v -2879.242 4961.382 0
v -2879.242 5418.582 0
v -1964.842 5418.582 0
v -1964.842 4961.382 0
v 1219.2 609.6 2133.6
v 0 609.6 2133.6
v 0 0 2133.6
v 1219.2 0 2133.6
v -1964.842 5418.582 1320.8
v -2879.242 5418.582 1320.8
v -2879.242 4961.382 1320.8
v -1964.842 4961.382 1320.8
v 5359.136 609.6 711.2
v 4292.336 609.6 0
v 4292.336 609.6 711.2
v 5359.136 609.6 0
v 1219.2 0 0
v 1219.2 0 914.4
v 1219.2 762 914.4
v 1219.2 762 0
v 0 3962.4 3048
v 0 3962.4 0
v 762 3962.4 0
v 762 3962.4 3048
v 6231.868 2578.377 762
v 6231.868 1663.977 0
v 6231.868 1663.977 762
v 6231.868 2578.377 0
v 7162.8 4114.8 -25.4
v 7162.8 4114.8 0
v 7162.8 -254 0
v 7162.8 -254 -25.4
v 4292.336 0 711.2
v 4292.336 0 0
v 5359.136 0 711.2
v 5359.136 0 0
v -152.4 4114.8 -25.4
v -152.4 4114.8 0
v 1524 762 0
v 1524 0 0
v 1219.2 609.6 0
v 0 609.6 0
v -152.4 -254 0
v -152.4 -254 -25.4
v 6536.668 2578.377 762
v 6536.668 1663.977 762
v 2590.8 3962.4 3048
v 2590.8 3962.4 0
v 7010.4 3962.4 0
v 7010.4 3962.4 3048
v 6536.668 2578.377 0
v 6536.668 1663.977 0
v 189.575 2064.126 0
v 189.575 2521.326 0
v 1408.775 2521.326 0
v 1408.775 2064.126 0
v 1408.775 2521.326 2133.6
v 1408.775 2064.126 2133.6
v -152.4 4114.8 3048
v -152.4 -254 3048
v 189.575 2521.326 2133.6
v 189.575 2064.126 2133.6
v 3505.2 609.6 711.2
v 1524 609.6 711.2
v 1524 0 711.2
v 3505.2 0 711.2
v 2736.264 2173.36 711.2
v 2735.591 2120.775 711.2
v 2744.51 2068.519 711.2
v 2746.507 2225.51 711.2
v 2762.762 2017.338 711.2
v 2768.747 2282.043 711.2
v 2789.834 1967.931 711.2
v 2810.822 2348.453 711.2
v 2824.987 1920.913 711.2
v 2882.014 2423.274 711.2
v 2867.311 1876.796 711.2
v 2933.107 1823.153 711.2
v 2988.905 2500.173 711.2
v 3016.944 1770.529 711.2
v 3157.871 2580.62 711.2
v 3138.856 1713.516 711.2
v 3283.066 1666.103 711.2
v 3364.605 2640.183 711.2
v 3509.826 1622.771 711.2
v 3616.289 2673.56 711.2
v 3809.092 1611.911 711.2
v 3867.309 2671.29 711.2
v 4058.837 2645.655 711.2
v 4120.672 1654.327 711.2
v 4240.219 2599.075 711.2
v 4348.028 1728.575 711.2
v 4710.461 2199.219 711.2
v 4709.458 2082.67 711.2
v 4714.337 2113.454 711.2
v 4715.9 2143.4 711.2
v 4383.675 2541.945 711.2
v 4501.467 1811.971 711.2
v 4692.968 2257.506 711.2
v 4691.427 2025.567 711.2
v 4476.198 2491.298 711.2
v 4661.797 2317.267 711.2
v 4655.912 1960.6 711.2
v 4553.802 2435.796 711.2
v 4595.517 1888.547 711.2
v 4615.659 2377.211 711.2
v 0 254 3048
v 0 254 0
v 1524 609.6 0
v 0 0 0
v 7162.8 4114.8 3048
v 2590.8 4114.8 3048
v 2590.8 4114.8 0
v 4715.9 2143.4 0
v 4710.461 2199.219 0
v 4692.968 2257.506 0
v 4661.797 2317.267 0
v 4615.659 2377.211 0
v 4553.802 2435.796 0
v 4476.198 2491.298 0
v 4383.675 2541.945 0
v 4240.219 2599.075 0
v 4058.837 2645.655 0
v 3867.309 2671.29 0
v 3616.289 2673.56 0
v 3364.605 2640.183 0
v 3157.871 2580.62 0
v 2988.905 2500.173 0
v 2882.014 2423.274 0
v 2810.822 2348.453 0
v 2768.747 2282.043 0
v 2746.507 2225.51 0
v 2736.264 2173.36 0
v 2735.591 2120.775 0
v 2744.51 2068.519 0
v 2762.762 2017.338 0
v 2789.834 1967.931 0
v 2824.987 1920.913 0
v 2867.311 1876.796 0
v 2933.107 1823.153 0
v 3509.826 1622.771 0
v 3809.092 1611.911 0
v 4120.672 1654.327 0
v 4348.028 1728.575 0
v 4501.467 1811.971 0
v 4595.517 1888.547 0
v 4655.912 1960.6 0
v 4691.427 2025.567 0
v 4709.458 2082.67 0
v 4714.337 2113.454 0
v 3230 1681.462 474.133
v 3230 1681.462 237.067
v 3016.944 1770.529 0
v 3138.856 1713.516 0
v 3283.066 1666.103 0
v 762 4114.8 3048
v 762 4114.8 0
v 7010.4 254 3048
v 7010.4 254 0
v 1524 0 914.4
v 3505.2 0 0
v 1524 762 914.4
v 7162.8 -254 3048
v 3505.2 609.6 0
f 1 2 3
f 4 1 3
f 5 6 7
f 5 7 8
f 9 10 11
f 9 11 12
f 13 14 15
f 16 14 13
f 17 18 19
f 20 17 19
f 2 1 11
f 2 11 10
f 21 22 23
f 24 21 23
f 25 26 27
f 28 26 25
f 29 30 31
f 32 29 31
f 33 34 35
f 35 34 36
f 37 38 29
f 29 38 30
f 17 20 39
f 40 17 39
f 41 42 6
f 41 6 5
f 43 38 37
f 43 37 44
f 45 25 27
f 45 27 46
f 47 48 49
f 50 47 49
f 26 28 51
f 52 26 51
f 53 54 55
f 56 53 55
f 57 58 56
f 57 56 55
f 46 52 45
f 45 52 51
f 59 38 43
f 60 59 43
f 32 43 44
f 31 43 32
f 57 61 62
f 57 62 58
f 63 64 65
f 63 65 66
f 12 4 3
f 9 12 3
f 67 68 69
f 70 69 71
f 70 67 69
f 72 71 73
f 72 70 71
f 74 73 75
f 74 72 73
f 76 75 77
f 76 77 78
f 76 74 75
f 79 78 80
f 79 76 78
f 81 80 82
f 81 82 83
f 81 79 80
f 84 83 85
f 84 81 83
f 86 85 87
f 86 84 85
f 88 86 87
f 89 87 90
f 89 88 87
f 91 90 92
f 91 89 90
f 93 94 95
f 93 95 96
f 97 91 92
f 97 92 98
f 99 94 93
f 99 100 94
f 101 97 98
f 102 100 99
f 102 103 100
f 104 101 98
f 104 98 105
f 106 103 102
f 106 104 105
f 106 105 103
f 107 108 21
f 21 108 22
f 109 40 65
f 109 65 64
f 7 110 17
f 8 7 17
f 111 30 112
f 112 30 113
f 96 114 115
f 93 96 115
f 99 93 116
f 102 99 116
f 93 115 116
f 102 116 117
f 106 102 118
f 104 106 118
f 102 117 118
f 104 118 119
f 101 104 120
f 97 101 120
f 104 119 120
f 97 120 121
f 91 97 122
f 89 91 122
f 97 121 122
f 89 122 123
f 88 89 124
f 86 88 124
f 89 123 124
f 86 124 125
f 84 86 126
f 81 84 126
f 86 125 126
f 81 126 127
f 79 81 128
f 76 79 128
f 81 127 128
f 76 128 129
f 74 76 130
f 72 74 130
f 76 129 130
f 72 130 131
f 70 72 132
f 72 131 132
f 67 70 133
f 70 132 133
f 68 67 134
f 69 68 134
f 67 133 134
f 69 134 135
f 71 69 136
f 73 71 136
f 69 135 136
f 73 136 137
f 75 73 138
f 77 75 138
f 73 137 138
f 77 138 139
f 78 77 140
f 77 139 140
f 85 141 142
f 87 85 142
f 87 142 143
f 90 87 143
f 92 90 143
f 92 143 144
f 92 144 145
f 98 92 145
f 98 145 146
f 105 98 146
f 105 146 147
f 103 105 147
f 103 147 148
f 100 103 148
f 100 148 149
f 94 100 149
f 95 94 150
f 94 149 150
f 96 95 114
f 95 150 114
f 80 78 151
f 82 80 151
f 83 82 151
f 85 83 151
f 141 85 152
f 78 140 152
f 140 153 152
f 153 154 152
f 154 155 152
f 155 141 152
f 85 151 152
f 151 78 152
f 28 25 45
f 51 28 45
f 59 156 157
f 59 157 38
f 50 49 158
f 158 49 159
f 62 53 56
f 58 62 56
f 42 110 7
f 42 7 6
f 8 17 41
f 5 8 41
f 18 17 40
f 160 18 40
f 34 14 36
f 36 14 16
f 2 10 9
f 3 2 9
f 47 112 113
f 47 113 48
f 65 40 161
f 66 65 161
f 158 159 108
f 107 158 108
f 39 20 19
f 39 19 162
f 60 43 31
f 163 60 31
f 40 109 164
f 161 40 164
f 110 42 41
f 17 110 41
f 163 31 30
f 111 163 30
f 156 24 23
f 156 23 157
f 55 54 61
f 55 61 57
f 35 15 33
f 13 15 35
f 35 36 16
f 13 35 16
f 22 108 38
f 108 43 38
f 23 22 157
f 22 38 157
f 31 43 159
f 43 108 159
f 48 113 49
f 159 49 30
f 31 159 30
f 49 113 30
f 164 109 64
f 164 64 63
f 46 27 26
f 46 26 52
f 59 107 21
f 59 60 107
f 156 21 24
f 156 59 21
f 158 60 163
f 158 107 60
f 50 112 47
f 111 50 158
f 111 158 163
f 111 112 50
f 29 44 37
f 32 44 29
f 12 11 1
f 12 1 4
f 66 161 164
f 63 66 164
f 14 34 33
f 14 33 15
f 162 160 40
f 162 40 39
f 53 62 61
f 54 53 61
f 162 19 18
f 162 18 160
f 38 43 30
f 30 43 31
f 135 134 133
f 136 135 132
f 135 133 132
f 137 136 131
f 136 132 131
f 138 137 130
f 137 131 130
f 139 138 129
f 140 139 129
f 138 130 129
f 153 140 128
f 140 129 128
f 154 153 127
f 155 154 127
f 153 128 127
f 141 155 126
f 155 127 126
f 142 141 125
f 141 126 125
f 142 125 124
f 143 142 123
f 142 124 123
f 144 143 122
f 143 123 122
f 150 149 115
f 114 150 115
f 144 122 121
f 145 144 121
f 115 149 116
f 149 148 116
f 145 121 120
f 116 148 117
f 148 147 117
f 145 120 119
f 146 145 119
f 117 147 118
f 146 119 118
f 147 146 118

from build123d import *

# Parameters (mm, degrees)
F1_DEPTH  = 3048
F2_W      = 7315.2
F2_H      = 4368.8
F3_DEPTH  = 25.4
F4_W      = 1219.2
F4_H      = 609.6
F5_DEPTH  = 2133.6
F6_W      = 304.8
F6_H      = 762
F7_DEPTH  = 914.4
F8_W      = 1981.2
F8_H      = 609.6
F9_DEPTH  = 711.2
F10_W     = 914.4
F10_H     = 457.2
F11_DEPTH = 1320.8
F12_W     = 1219.2
F12_H     = 457.2
F13_DEPTH = 2133.6
F14_W     = 1066.8
F14_H     = 609.6
F15_DEPTH = 711.2
F16_W     = 304.8
F16_H     = 914.4
F17_DEPTH = 762
F19_DEPTH = 711.2


with BuildPart() as f1:
    # F0 (on Top) → F1 (new body)
    with BuildSketch(Plane.XY):
        Polygon((0, 254), (0, 3962.4), (762, 3962.4), (762, 4114.8), (-152.4, 4114.8), (-152.4, -254), (7162.8, -254), (7162.8, 4114.8), (2590.8, 4114.8), (2590.8, 3962.4), (7010.4, 3962.4), (7010.4, 254), align=None)
    extrude(amount=F1_DEPTH)


with BuildPart() as f3:
    # F2 (on face) → F3 (new body)
    with BuildSketch(Plane(origin=(0, 0, 0), x_dir=(1, 0, 0), z_dir=(0, 0, -1))):
        with Locations((3505.2, -1930.4)):
            Rectangle(F2_W, F2_H)
    extrude(amount=F3_DEPTH)


with BuildPart() as f5:
    # F4 (on face) → F5 (new body)
    with BuildSketch(Plane.XY):
        with Locations((609.6, 304.8)):
            Rectangle(F4_W, F4_H)
    extrude(amount=F5_DEPTH)


with BuildPart() as f7:
    # F6 (on face) → F7 (new body)
    with BuildSketch(Plane.XY):
        with Locations((1371.6, 381)):
            Rectangle(F6_W, F6_H)
    extrude(amount=F7_DEPTH)


with BuildPart() as f9:
    # F8 (on face) → F9 (new body)
    with BuildSketch(Plane.XY):
        with Locations((2514.6, 304.8)):
            Rectangle(F8_W, F8_H)
    extrude(amount=F9_DEPTH)


with BuildPart() as f11:
    # F10 (on face) → F11 (new body)
    with BuildSketch(Plane.XY):
        with Locations((-2422.0422506332, 5189.9824540843)):
            Rectangle(F10_W, F10_H)
    extrude(amount=F11_DEPTH)


with BuildPart() as f13:
    # F12 (on face) → F13 (new body)
    with BuildSketch(Plane.XY):
        with Locations((799.1747409105, 2292.7259836081)):
            Rectangle(F12_W, F12_H)
    extrude(amount=F13_DEPTH)


with BuildPart() as f15:
    # F14 (on face) → F15 (new body)
    with BuildSketch(Plane.XY):
        with Locations((4825.7355830946, 304.8)):
            Rectangle(F14_W, F14_H)
    extrude(amount=F15_DEPTH)


with BuildPart() as f17:
    # F16 (on face) → F17 (new body)
    with BuildSketch(Plane.XY):
        with Locations((6384.268346407, 2121.177315712)):
            Rectangle(F16_W, F16_H)
    extrude(amount=F17_DEPTH)


with BuildPart() as f19:
    # F18 (on face) → F19 (new body)
    with BuildSketch(Plane.XY):
        with BuildLine():
            add(Edge.make_bspline(
                [(4715.8998352051, 2143.3997154236), (4715.8998352051, 3067.2756161808), (3229.9998352051, 2605.3376658022), (1744.0998352051, 2143.3997154236), (3229.9998352051, 1681.461765045), (4715.8998352051, 1219.5238146663), (4715.8998352051, 2143.3997154236)],
                knots=[0, 0, 0, 2.0943951024, 2.0943951024, 4.1887902048, 4.1887902048, 6.2831853072, 6.2831853072, 6.2831853072], degree=2, weights=[1, 0.5, 1, 0.5, 1, 0.5, 1]))
        make_face()
    extrude(amount=F19_DEPTH)


solid = Compound([f1.part, f3.part, f5.part, f7.part, f9.part, f11.part, f13.part, f15.part, f17.part, f19.part])
